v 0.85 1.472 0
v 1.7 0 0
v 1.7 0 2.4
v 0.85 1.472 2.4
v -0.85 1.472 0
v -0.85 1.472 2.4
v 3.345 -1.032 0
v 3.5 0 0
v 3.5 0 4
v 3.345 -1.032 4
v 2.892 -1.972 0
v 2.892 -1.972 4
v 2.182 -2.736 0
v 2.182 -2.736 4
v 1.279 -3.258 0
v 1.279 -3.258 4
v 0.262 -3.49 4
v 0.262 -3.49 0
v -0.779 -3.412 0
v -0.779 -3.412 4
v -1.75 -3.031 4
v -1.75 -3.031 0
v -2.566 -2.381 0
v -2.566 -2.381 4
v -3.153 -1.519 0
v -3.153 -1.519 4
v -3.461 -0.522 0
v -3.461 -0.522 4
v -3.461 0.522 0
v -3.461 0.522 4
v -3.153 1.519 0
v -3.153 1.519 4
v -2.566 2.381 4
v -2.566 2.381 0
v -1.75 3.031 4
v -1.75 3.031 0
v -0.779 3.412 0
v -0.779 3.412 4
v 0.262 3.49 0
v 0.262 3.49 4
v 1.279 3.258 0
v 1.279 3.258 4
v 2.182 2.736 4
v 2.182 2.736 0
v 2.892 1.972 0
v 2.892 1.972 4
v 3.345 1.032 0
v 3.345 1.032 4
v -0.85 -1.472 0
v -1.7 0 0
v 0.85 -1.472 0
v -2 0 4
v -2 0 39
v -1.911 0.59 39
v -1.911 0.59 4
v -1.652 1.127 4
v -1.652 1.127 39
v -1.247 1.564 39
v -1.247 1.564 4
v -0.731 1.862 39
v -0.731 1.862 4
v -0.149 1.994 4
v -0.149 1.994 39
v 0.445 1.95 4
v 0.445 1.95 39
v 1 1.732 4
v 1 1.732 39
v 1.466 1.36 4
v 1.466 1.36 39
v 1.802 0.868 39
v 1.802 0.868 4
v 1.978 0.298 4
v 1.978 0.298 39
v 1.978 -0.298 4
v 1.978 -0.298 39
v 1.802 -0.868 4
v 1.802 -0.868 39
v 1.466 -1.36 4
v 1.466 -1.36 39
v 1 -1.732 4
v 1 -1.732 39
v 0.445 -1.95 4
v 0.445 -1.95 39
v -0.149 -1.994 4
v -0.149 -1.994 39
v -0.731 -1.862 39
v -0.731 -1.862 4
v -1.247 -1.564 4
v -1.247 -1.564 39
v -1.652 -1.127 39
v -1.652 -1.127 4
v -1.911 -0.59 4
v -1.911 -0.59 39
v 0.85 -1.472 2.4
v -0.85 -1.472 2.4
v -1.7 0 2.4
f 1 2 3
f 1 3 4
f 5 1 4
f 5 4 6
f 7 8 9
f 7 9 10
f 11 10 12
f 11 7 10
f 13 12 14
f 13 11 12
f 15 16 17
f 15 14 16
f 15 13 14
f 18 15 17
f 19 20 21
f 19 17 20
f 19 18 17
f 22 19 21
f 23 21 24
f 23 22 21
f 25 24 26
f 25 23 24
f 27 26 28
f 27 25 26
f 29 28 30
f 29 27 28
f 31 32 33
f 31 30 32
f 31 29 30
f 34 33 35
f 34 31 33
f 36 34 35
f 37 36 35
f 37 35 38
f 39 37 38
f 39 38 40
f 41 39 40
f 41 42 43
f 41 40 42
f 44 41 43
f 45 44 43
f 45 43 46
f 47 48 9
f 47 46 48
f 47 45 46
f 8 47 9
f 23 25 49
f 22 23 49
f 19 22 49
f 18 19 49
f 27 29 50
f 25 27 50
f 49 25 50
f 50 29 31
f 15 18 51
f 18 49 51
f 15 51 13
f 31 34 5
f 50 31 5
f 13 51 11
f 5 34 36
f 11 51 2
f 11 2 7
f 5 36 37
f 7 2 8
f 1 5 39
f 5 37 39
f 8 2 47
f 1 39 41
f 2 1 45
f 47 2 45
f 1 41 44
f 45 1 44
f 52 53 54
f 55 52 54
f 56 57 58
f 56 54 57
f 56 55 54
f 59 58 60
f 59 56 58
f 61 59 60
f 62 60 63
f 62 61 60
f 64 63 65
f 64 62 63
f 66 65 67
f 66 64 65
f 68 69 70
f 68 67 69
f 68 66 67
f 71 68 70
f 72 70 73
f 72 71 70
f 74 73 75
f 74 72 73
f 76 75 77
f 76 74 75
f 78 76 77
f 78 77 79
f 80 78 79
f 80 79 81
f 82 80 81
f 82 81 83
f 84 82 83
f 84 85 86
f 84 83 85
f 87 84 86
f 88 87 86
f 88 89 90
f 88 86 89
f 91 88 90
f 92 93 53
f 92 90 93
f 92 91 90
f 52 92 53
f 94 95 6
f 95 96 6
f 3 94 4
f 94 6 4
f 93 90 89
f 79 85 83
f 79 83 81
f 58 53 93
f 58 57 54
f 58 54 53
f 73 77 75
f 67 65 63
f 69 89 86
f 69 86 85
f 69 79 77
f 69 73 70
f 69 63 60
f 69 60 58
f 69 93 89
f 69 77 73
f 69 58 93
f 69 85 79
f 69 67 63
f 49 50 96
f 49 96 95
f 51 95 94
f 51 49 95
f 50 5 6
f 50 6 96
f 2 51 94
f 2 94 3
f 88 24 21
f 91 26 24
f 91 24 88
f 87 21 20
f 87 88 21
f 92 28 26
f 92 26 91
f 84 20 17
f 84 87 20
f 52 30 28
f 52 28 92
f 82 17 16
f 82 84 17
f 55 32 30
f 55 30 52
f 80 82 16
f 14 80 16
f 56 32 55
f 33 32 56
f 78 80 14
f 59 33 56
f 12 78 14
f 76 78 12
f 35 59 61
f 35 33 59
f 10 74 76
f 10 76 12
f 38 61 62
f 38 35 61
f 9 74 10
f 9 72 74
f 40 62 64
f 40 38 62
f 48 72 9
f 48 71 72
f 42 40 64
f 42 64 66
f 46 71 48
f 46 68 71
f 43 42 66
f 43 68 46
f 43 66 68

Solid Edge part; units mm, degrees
sketch "Sketch1" plane through (0, 0, 0) normal (0, 0, 1) x (1, 0, 0)
  circle A0 centre (0, 0) radius 3.5
extrude "Protrusion1" add sketch "Sketch1" along normal blind 4
sketch "Sketch2" plane through (0, 0, 0) normal (0, 0, -1) x (1, 0, 0)
  line L0 (0.85, 1.4722) -> (1.7, 0)
  line L1 (1.7, 0) -> (0.85, -1.4722)
  line L2 (0.85, -1.4722) -> (-0.85, -1.4722)
  line L3 (-0.85, -1.4722) -> (-1.7, 0)
  line L4 (-1.7, 0) -> (-0.85, 1.4722)
  line L5 (-0.85, 1.4722) -> (0.85, 1.4722)
extrude "ExtrudedCutout_1" cut sketch "Sketch2" against normal blind 2.4
sketch "Sketch3" plane through (0, 0, 4) normal (0, 0, 1) x (-1, 0, 0)
  circle A0 centre (0, 0) radius 2
extrude "ExtrudedProtrusion_2" add sketch "Sketch3" along normal blind 35
cosmetic_thread "Thread_2" size "M4" thread depth 20
